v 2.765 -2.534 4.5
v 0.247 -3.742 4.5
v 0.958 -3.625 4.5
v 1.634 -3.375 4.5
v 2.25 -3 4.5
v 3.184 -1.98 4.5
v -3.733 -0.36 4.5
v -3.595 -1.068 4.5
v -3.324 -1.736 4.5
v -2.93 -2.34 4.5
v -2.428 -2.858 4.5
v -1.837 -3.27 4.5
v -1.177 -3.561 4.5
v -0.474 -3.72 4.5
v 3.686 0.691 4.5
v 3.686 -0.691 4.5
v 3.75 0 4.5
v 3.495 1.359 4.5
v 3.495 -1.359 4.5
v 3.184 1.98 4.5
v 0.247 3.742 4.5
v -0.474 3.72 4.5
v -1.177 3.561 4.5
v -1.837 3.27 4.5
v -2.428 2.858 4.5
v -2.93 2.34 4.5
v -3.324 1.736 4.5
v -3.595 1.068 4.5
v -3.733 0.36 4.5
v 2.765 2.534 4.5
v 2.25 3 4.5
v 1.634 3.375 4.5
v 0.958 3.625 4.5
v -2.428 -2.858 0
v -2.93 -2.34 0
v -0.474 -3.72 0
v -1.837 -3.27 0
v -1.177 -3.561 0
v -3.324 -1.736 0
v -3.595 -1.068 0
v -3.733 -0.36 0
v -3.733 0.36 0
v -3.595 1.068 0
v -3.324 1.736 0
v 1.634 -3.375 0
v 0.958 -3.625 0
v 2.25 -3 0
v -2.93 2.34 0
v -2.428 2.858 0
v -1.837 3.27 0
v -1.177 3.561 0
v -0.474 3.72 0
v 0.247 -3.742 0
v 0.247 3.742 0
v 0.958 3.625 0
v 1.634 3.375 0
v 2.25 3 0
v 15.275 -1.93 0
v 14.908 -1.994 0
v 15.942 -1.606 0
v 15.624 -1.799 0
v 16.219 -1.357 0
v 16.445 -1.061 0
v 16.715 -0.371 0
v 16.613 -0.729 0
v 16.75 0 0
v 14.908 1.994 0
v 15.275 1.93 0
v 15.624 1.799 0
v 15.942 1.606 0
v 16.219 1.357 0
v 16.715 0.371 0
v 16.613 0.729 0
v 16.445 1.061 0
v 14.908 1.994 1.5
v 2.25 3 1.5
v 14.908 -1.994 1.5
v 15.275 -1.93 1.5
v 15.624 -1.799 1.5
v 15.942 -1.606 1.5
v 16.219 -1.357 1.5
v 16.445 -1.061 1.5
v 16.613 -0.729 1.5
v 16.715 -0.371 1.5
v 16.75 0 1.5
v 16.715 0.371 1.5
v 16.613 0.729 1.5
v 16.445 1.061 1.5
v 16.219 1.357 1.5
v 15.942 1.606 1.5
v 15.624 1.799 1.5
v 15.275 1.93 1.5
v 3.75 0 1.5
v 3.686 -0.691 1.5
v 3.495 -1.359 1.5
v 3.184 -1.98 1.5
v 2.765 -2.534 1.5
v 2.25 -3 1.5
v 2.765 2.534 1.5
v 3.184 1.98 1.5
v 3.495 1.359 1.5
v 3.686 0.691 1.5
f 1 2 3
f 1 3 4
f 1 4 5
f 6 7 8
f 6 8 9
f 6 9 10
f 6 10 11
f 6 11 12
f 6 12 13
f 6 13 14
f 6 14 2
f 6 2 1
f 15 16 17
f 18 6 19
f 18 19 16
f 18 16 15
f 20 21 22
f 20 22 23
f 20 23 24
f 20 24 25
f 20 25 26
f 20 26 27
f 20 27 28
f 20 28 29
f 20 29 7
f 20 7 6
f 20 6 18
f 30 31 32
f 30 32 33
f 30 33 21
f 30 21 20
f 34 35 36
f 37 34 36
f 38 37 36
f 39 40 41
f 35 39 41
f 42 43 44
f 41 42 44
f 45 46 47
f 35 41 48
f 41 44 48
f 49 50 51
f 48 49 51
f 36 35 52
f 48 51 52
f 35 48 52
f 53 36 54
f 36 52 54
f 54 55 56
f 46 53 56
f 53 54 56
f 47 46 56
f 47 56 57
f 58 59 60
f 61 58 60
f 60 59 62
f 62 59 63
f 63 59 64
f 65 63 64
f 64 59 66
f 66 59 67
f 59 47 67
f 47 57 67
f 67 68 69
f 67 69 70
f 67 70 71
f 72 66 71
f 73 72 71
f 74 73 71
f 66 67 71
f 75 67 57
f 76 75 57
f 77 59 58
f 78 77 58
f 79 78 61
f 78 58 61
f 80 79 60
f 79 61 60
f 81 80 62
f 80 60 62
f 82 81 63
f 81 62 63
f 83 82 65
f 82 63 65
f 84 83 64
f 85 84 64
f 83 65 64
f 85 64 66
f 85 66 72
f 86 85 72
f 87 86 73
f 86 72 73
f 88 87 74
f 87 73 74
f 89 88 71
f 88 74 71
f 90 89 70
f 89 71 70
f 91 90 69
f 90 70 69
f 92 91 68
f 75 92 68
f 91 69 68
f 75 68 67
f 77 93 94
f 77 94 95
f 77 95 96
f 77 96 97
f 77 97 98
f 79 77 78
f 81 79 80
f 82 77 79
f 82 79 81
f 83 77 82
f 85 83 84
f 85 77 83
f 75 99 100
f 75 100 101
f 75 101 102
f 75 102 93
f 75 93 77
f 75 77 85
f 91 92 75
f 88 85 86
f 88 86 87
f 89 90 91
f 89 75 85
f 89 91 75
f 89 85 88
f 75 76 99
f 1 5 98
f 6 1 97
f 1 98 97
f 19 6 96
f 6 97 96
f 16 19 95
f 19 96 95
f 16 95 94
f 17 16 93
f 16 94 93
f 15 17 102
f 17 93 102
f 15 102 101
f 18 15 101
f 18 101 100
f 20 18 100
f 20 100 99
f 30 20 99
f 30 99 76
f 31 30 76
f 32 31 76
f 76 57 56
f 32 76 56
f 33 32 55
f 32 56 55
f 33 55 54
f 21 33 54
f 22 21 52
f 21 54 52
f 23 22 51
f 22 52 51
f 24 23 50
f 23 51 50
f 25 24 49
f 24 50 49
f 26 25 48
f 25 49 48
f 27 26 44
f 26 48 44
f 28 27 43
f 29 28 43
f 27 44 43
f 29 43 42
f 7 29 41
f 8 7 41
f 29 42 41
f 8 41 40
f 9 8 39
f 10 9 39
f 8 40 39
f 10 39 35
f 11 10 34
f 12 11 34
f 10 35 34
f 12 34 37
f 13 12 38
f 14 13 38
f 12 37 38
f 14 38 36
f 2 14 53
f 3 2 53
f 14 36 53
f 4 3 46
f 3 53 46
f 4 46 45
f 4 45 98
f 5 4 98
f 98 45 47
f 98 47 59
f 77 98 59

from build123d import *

# Parameters (mm, degrees)
F1_DEPTH = 1.5
F2_DEPTH = 4.5


# Not quite as in the source:
# - a feature names something its author has since deleted; it is built from what else it names


with BuildPart() as f1:
    # F0 (on Top) → F1 (new body)
    with BuildSketch(Plane.XY):
        with BuildLine():
            ThreePointArc((2.25, -3), (3.3541019662, -1.6770509831), (3.75, 0))
            ThreePointArc((3.75, 0), (3.3541019662, 1.6770509831), (2.25, 3))
            ThreePointArc((2.25, 3), (-3.75, 0), (2.25, -3))
        make_face()
        with BuildLine():
            ThreePointArc((16.75, 0), (16.2191802202, 1.3570222845), (14.9084905194, 1.9937102987))
            ThreePointArc((14.9084905194, 1.9937102987), (12.75, 0), (14.9084905194, -1.9937102987))
            ThreePointArc((14.9084905194, -1.9937102987), (16.2191802202, -1.3570222845), (16.75, 0))
        make_face()
        with BuildLine():
            ThreePointArc((2.25, 3), (3.3541019662, 1.6770509831), (3.75, 0))
            ThreePointArc((3.75, 0), (3.3541019662, -1.6770509831), (2.25, -3))
            Line((2.25, -3), (14.9084905194, -1.9937102987))
            ThreePointArc((14.9084905194, -1.9937102987), (12.75, 0), (14.9084905194, 1.9937102987))
            Line((14.9084905194, 1.9937102987), (2.25, 3))
        make_face()
    extrude(amount=F1_DEPTH)

    # F0 (on Top) → F2 (join)
    with BuildSketch(Plane.XY):
        with BuildLine():
            ThreePointArc((2.25, -3), (3.3541019662, -1.6770509831), (3.75, 0))
            ThreePointArc((3.75, 0), (3.3541019662, 1.6770509831), (2.25, 3))
            ThreePointArc((2.25, 3), (-3.75, 0), (2.25, -3))
        make_face()
    extrude(amount=F2_DEPTH)


solid = f1.part
